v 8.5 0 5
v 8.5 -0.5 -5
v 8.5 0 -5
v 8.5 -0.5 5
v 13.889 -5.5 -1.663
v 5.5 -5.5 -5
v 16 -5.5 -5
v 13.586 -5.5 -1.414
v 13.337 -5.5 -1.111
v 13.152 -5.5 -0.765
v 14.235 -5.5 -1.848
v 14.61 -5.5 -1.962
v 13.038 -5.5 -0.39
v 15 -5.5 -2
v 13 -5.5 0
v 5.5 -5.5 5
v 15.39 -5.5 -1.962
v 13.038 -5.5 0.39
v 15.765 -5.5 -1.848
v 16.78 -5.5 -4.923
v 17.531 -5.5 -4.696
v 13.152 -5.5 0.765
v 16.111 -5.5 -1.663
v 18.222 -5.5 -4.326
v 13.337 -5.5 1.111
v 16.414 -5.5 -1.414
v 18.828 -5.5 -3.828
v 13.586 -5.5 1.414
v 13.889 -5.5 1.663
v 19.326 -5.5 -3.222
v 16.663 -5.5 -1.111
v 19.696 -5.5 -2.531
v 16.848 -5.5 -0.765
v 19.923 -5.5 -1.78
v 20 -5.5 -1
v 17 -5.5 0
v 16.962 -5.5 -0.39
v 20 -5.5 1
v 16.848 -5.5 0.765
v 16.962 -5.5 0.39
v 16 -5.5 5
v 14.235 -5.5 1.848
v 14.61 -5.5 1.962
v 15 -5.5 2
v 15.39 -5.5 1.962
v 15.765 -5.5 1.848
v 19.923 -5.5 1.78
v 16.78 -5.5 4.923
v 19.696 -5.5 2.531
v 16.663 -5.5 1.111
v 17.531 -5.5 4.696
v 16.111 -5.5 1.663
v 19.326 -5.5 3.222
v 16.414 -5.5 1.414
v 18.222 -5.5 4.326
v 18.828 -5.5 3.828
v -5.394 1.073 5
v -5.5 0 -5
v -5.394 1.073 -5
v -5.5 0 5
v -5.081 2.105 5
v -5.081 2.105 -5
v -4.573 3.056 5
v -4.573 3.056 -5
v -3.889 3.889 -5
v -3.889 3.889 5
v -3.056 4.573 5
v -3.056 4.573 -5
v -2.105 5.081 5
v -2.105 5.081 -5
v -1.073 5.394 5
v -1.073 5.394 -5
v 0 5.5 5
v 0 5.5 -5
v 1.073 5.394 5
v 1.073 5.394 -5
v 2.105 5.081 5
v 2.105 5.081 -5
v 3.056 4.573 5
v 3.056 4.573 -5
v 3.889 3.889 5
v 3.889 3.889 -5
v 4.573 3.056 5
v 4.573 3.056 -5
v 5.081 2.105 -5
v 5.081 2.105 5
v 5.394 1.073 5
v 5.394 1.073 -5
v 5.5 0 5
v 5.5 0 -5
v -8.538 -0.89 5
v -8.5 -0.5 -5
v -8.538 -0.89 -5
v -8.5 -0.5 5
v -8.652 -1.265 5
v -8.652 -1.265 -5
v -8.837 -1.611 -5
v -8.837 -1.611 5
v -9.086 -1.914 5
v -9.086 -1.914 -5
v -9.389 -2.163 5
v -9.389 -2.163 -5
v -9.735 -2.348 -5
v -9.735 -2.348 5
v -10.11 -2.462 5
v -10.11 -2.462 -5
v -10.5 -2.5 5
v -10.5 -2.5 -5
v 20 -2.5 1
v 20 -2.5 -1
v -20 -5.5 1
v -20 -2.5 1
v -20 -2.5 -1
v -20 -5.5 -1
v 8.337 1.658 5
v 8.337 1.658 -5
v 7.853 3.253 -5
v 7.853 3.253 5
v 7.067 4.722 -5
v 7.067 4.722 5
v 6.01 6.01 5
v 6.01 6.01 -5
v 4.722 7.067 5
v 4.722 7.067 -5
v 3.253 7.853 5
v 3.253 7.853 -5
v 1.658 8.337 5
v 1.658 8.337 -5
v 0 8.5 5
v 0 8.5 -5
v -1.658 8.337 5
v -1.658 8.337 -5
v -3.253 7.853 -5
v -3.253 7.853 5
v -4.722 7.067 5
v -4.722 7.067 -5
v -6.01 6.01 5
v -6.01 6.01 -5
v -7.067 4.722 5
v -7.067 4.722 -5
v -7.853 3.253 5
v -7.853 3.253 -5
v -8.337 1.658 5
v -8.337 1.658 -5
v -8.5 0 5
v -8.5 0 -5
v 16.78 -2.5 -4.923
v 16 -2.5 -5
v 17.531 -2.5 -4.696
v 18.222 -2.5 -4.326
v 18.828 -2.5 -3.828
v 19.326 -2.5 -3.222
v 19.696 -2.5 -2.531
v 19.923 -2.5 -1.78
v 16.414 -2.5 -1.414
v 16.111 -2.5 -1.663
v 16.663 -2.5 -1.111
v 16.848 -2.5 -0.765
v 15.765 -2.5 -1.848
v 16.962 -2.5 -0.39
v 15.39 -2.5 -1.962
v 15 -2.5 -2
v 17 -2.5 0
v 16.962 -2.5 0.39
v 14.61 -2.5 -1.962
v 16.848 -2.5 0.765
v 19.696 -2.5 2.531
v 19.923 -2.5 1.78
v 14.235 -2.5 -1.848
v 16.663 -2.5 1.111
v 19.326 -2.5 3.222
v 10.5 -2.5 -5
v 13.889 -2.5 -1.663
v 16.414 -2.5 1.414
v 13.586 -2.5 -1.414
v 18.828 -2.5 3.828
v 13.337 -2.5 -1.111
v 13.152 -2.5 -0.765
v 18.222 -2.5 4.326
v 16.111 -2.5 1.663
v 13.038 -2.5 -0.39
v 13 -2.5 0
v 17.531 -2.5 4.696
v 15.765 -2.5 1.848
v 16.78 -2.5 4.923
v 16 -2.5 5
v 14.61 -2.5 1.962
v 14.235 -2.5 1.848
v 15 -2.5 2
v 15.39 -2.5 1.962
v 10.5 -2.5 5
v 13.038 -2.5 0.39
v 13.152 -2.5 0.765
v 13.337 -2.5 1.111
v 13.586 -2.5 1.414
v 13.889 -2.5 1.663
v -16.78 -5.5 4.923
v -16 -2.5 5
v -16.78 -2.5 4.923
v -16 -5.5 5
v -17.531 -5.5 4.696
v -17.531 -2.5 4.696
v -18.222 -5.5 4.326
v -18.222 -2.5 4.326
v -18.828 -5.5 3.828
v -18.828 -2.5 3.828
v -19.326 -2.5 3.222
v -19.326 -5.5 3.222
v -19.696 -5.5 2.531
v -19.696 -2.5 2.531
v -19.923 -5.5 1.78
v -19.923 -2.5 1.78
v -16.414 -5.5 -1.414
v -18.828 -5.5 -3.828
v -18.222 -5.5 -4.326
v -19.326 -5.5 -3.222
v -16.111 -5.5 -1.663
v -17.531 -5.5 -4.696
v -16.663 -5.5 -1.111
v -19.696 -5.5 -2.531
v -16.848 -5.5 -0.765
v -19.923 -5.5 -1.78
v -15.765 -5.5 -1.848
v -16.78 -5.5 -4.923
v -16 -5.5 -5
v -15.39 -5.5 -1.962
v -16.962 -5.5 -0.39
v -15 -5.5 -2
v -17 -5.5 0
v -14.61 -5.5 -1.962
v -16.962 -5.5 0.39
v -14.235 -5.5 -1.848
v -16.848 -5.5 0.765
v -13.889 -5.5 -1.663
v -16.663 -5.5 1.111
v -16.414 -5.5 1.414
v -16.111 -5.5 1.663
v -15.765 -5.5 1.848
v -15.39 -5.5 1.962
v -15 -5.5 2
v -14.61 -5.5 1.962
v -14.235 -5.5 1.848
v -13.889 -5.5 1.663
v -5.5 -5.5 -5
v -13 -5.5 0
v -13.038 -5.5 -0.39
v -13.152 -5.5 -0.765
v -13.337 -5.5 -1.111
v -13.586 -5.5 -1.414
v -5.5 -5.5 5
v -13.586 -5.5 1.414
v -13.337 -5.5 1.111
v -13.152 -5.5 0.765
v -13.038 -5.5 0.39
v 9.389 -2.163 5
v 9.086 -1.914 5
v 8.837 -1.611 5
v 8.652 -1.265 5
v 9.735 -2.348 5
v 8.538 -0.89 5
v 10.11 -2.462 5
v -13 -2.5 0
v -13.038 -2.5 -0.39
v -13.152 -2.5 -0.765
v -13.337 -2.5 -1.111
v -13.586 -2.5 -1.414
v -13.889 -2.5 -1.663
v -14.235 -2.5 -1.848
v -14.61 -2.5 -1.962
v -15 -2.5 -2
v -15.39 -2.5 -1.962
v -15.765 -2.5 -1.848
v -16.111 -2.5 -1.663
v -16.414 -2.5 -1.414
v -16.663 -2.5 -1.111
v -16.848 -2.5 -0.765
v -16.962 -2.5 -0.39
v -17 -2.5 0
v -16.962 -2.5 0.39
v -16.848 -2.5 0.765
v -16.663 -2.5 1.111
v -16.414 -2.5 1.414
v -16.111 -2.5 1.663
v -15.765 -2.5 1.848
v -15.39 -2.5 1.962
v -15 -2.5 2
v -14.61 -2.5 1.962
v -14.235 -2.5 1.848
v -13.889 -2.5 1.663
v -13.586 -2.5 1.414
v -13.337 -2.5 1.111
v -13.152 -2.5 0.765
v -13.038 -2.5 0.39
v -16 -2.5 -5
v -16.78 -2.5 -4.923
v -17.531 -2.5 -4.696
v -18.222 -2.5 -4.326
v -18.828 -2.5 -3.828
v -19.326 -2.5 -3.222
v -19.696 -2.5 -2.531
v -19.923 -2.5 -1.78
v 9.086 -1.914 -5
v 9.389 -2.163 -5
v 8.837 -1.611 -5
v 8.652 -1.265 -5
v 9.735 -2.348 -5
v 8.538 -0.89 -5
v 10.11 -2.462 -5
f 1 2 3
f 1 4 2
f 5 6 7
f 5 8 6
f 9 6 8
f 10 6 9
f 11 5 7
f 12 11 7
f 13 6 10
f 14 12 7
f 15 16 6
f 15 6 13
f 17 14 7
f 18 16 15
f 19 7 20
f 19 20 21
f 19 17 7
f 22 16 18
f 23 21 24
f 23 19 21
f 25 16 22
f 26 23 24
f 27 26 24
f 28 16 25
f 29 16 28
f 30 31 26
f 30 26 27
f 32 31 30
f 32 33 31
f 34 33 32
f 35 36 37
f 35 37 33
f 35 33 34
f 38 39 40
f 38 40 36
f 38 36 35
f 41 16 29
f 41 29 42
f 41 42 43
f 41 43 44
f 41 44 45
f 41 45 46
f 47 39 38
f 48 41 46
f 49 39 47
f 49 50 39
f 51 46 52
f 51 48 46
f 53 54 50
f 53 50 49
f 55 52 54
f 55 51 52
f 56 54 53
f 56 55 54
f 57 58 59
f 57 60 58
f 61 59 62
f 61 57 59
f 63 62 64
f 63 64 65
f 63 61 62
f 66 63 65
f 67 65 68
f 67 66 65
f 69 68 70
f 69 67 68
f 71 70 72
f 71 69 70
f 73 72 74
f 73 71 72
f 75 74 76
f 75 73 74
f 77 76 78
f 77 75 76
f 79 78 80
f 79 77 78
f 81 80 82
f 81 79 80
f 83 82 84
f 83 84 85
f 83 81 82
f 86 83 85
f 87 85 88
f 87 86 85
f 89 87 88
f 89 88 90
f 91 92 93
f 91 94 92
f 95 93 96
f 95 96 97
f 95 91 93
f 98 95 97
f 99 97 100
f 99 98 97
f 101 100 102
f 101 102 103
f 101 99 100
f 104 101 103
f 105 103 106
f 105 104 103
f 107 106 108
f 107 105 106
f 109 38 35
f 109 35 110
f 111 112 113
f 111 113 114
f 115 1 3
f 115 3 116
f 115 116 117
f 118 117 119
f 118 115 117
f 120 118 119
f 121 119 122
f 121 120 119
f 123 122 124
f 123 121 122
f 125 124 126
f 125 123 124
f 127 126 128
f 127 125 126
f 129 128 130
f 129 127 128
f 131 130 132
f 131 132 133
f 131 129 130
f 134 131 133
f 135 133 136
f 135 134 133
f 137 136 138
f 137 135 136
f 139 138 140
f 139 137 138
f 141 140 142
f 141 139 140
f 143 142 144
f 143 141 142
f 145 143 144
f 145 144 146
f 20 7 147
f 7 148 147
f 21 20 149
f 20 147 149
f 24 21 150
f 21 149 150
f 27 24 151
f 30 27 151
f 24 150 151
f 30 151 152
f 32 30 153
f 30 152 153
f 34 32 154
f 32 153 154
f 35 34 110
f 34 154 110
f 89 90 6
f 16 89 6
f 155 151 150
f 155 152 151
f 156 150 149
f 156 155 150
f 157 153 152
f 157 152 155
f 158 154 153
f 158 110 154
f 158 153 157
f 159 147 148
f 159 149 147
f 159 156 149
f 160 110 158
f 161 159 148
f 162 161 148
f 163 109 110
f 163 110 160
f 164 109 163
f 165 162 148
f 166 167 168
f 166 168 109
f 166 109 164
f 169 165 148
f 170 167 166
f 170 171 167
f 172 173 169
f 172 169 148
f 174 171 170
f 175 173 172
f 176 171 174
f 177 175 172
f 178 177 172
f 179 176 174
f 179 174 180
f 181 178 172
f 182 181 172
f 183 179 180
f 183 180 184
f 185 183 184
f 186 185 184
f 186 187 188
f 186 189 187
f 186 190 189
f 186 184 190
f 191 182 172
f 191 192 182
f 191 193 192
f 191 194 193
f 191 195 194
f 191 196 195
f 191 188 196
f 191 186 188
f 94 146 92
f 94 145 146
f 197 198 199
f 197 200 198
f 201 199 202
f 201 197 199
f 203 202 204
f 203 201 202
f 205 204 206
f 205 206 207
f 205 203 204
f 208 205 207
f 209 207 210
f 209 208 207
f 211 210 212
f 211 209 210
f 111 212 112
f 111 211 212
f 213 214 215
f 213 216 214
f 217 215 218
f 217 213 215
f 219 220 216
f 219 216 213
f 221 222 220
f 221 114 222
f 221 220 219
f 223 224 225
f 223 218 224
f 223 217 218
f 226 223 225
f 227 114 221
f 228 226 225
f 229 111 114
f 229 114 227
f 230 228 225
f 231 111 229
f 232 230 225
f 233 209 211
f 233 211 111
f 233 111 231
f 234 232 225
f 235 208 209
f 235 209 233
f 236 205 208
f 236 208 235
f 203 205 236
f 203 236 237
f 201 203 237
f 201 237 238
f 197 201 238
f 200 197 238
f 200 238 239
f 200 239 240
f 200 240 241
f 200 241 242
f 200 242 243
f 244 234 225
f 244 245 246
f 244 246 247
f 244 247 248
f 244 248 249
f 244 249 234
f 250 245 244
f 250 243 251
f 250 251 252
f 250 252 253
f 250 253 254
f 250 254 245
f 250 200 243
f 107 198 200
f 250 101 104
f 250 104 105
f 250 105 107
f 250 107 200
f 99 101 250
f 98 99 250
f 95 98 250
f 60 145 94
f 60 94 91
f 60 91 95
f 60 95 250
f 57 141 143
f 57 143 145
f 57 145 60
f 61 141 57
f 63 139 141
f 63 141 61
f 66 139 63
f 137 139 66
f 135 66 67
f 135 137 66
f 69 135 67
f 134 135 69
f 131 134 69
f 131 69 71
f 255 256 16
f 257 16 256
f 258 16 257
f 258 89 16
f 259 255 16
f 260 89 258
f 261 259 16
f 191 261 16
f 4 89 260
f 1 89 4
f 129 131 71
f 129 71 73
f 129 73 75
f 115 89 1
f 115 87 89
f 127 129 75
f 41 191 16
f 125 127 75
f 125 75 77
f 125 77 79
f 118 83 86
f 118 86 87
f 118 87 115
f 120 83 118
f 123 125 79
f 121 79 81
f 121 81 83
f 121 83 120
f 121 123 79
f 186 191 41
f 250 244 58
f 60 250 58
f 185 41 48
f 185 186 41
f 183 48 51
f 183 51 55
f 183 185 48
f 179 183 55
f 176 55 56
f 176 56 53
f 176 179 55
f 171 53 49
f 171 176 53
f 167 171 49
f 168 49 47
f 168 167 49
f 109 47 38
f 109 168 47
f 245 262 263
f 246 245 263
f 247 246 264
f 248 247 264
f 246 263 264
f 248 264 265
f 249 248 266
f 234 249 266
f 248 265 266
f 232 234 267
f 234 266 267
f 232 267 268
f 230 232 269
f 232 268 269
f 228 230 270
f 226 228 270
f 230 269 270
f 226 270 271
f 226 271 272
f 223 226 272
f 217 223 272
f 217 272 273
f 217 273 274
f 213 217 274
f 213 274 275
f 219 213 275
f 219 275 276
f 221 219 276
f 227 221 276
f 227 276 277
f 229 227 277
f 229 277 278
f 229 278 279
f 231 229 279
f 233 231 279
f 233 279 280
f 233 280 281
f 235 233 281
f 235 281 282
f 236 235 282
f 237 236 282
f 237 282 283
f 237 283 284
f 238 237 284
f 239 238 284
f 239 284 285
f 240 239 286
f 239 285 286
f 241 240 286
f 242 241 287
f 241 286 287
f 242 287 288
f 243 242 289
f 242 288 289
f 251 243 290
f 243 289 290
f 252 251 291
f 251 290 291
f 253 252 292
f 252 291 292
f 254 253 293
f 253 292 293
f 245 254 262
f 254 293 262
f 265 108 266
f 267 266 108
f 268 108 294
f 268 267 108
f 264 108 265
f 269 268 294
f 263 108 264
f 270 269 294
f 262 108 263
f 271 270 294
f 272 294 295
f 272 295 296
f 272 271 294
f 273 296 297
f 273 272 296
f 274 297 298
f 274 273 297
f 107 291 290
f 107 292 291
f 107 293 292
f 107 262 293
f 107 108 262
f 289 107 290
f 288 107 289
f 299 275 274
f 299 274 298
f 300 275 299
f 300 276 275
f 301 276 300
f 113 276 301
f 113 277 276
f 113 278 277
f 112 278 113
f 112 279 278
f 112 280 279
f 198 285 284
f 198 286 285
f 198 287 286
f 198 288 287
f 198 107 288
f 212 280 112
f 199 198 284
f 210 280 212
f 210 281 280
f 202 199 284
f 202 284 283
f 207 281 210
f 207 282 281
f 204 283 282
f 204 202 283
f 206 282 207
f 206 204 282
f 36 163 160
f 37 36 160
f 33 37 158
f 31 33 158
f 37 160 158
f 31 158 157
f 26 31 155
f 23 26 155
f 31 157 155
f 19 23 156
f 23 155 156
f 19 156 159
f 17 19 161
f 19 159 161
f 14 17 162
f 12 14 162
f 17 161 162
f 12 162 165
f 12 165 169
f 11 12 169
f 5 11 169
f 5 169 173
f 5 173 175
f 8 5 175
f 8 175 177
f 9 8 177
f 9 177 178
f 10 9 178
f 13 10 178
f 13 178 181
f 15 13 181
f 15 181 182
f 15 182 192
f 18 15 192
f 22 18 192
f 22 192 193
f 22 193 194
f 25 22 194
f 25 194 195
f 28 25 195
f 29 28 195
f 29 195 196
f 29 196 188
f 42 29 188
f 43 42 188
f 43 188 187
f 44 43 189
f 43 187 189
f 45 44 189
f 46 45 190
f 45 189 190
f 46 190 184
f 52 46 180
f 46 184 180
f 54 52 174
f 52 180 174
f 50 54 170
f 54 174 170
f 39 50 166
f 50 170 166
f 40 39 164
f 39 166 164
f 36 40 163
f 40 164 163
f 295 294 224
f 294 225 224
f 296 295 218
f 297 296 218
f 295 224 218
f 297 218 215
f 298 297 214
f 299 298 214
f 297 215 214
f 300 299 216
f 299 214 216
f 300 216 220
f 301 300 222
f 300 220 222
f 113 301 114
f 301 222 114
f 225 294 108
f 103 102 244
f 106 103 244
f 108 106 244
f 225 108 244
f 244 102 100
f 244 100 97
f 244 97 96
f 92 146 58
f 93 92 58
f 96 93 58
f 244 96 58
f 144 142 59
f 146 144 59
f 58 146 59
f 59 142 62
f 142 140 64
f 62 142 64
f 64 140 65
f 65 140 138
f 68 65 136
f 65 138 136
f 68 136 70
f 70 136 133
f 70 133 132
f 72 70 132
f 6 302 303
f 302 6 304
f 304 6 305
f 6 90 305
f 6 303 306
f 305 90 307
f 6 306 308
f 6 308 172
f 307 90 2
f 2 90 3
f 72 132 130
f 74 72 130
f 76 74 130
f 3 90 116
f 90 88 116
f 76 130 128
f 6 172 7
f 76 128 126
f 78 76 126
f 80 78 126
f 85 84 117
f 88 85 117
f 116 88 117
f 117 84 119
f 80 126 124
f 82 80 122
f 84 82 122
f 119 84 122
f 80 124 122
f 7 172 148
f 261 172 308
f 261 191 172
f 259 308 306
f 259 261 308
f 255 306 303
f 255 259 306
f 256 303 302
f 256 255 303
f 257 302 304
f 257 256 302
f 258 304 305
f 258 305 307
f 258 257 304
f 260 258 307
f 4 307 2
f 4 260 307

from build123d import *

# Parameters (mm, degrees)
BOSS_EXTRUDE1_DEPTH = 5
SKETCH2_R           = 2
CUT_EXTRUDE1_DEPTH  = 4
FILLET1_R           = 4
FILLET2_R           = 2


with BuildPart() as part:
    # Sketch1 → Boss-Extrude1 (new body, symmetric)
    with BuildSketch(Plane.XY):
        with BuildLine():
            Line((-5.5, -2.5), (-5.5, 0))
            ThreePointArc((-5.5, 0), (0, 5.5), (5.5, 0))
            Line((5.5, 0), (5.5, -2.5))
            Line((5.5, -2.5), (8.124038405, -2.5))
            ThreePointArc((8.124038405, -2.5), (8.405484116, -1.264055687), (8.5, 0))
            ThreePointArc((8.5, 0), (0, 8.5), (-8.5, 0))
            ThreePointArc((-8.5, 0), (-8.405484116, -1.264055687), (-8.124038405, -2.5))
            Line((-8.124038405, -2.5), (-5.5, -2.5))
        make_face()
        with BuildLine():
            Line((-5.5, -5.5), (-5.5, -2.5))
            Line((-5.5, -2.5), (-8.124038405, -2.5))
            ThreePointArc((-8.124038405, -2.5), (-7.454857018, -4.083516479), (-6.480740698, -5.5))
            Line((-6.480740698, -5.5), (-5.5, -5.5))
        make_face()
        with BuildLine():
            ThreePointArc((-6.480740698, -5.5), (-7.454857018, -4.083516479), (-8.124038405, -2.5))
            Line((-8.124038405, -2.5), (-8.5, -2.5))
            Line((-8.5, -2.5), (-20, -2.5))
            Line((-20, -2.5), (-20, -5.5))
            Line((-20, -5.5), (-6.480740698, -5.5))
        make_face()
        with BuildLine():
            Line((8.124038405, -2.5), (5.5, -2.5))
            Line((5.5, -2.5), (5.5, -5.5))
            Line((5.5, -5.5), (6.480740698, -5.5))
            ThreePointArc((6.480740698, -5.5), (7.454857018, -4.083516479), (8.124038405, -2.5))
        make_face()
        with BuildLine():
            Line((8.5, -2.5), (8.124038405, -2.5))
            ThreePointArc((8.124038405, -2.5), (7.454857018, -4.083516479), (6.480740698, -5.5))
            Line((6.480740698, -5.5), (20, -5.5))
            Line((20, -5.5), (20, -2.5))
            Line((20, -2.5), (8.5, -2.5))
        make_face()
        with BuildLine():
            ThreePointArc((8.5, 0), (8.405484116, -1.264055687), (8.124038405, -2.5))
            Line((8.124038405, -2.5), (8.5, -2.5))
            Line((8.5, -2.5), (8.5, 0))
        make_face()
        with BuildLine():
            Line((-8.5, -2.5), (-8.124038405, -2.5))
            ThreePointArc((-8.124038405, -2.5), (-8.405484116, -1.264055687), (-8.5, 0))
            Line((-8.5, 0), (-8.5, -2.5))
        make_face()
    extrude(amount=BOSS_EXTRUDE1_DEPTH, both=True)

    # Sketch2 → Cut-Extrude1 (cut, through all)
    with BuildSketch(Plane(origin=(0, -2.5, 0), x_dir=(1, 0, 0), z_dir=(0, 1, 0))):
        with Locations((-15, 0)):
            Circle(SKETCH2_R)
        with Locations((15, 0)):
            Circle(SKETCH2_R)
    extrude(amount=-CUT_EXTRUDE1_DEPTH, mode=Mode.SUBTRACT)

    # Fillet1
    fillet1_edges = [part.edges().sort_by_distance(p)[0] for p in [
        (20, -4, -5),
        (-20, -4, -5),
        (-20, -4, 5),
        (20, -4, 5),
    ]]
    fillet(fillet1_edges, radius=FILLET1_R)

    # Fillet2
    fillet2_edges = [part.edges().sort_by_distance(p)[0] for p in [
        (-8.5, -2.5, 0),
        (8.5, -2.5, 0),
    ]]
    fillet(fillet2_edges, radius=FILLET2_R)


solid = part.part
